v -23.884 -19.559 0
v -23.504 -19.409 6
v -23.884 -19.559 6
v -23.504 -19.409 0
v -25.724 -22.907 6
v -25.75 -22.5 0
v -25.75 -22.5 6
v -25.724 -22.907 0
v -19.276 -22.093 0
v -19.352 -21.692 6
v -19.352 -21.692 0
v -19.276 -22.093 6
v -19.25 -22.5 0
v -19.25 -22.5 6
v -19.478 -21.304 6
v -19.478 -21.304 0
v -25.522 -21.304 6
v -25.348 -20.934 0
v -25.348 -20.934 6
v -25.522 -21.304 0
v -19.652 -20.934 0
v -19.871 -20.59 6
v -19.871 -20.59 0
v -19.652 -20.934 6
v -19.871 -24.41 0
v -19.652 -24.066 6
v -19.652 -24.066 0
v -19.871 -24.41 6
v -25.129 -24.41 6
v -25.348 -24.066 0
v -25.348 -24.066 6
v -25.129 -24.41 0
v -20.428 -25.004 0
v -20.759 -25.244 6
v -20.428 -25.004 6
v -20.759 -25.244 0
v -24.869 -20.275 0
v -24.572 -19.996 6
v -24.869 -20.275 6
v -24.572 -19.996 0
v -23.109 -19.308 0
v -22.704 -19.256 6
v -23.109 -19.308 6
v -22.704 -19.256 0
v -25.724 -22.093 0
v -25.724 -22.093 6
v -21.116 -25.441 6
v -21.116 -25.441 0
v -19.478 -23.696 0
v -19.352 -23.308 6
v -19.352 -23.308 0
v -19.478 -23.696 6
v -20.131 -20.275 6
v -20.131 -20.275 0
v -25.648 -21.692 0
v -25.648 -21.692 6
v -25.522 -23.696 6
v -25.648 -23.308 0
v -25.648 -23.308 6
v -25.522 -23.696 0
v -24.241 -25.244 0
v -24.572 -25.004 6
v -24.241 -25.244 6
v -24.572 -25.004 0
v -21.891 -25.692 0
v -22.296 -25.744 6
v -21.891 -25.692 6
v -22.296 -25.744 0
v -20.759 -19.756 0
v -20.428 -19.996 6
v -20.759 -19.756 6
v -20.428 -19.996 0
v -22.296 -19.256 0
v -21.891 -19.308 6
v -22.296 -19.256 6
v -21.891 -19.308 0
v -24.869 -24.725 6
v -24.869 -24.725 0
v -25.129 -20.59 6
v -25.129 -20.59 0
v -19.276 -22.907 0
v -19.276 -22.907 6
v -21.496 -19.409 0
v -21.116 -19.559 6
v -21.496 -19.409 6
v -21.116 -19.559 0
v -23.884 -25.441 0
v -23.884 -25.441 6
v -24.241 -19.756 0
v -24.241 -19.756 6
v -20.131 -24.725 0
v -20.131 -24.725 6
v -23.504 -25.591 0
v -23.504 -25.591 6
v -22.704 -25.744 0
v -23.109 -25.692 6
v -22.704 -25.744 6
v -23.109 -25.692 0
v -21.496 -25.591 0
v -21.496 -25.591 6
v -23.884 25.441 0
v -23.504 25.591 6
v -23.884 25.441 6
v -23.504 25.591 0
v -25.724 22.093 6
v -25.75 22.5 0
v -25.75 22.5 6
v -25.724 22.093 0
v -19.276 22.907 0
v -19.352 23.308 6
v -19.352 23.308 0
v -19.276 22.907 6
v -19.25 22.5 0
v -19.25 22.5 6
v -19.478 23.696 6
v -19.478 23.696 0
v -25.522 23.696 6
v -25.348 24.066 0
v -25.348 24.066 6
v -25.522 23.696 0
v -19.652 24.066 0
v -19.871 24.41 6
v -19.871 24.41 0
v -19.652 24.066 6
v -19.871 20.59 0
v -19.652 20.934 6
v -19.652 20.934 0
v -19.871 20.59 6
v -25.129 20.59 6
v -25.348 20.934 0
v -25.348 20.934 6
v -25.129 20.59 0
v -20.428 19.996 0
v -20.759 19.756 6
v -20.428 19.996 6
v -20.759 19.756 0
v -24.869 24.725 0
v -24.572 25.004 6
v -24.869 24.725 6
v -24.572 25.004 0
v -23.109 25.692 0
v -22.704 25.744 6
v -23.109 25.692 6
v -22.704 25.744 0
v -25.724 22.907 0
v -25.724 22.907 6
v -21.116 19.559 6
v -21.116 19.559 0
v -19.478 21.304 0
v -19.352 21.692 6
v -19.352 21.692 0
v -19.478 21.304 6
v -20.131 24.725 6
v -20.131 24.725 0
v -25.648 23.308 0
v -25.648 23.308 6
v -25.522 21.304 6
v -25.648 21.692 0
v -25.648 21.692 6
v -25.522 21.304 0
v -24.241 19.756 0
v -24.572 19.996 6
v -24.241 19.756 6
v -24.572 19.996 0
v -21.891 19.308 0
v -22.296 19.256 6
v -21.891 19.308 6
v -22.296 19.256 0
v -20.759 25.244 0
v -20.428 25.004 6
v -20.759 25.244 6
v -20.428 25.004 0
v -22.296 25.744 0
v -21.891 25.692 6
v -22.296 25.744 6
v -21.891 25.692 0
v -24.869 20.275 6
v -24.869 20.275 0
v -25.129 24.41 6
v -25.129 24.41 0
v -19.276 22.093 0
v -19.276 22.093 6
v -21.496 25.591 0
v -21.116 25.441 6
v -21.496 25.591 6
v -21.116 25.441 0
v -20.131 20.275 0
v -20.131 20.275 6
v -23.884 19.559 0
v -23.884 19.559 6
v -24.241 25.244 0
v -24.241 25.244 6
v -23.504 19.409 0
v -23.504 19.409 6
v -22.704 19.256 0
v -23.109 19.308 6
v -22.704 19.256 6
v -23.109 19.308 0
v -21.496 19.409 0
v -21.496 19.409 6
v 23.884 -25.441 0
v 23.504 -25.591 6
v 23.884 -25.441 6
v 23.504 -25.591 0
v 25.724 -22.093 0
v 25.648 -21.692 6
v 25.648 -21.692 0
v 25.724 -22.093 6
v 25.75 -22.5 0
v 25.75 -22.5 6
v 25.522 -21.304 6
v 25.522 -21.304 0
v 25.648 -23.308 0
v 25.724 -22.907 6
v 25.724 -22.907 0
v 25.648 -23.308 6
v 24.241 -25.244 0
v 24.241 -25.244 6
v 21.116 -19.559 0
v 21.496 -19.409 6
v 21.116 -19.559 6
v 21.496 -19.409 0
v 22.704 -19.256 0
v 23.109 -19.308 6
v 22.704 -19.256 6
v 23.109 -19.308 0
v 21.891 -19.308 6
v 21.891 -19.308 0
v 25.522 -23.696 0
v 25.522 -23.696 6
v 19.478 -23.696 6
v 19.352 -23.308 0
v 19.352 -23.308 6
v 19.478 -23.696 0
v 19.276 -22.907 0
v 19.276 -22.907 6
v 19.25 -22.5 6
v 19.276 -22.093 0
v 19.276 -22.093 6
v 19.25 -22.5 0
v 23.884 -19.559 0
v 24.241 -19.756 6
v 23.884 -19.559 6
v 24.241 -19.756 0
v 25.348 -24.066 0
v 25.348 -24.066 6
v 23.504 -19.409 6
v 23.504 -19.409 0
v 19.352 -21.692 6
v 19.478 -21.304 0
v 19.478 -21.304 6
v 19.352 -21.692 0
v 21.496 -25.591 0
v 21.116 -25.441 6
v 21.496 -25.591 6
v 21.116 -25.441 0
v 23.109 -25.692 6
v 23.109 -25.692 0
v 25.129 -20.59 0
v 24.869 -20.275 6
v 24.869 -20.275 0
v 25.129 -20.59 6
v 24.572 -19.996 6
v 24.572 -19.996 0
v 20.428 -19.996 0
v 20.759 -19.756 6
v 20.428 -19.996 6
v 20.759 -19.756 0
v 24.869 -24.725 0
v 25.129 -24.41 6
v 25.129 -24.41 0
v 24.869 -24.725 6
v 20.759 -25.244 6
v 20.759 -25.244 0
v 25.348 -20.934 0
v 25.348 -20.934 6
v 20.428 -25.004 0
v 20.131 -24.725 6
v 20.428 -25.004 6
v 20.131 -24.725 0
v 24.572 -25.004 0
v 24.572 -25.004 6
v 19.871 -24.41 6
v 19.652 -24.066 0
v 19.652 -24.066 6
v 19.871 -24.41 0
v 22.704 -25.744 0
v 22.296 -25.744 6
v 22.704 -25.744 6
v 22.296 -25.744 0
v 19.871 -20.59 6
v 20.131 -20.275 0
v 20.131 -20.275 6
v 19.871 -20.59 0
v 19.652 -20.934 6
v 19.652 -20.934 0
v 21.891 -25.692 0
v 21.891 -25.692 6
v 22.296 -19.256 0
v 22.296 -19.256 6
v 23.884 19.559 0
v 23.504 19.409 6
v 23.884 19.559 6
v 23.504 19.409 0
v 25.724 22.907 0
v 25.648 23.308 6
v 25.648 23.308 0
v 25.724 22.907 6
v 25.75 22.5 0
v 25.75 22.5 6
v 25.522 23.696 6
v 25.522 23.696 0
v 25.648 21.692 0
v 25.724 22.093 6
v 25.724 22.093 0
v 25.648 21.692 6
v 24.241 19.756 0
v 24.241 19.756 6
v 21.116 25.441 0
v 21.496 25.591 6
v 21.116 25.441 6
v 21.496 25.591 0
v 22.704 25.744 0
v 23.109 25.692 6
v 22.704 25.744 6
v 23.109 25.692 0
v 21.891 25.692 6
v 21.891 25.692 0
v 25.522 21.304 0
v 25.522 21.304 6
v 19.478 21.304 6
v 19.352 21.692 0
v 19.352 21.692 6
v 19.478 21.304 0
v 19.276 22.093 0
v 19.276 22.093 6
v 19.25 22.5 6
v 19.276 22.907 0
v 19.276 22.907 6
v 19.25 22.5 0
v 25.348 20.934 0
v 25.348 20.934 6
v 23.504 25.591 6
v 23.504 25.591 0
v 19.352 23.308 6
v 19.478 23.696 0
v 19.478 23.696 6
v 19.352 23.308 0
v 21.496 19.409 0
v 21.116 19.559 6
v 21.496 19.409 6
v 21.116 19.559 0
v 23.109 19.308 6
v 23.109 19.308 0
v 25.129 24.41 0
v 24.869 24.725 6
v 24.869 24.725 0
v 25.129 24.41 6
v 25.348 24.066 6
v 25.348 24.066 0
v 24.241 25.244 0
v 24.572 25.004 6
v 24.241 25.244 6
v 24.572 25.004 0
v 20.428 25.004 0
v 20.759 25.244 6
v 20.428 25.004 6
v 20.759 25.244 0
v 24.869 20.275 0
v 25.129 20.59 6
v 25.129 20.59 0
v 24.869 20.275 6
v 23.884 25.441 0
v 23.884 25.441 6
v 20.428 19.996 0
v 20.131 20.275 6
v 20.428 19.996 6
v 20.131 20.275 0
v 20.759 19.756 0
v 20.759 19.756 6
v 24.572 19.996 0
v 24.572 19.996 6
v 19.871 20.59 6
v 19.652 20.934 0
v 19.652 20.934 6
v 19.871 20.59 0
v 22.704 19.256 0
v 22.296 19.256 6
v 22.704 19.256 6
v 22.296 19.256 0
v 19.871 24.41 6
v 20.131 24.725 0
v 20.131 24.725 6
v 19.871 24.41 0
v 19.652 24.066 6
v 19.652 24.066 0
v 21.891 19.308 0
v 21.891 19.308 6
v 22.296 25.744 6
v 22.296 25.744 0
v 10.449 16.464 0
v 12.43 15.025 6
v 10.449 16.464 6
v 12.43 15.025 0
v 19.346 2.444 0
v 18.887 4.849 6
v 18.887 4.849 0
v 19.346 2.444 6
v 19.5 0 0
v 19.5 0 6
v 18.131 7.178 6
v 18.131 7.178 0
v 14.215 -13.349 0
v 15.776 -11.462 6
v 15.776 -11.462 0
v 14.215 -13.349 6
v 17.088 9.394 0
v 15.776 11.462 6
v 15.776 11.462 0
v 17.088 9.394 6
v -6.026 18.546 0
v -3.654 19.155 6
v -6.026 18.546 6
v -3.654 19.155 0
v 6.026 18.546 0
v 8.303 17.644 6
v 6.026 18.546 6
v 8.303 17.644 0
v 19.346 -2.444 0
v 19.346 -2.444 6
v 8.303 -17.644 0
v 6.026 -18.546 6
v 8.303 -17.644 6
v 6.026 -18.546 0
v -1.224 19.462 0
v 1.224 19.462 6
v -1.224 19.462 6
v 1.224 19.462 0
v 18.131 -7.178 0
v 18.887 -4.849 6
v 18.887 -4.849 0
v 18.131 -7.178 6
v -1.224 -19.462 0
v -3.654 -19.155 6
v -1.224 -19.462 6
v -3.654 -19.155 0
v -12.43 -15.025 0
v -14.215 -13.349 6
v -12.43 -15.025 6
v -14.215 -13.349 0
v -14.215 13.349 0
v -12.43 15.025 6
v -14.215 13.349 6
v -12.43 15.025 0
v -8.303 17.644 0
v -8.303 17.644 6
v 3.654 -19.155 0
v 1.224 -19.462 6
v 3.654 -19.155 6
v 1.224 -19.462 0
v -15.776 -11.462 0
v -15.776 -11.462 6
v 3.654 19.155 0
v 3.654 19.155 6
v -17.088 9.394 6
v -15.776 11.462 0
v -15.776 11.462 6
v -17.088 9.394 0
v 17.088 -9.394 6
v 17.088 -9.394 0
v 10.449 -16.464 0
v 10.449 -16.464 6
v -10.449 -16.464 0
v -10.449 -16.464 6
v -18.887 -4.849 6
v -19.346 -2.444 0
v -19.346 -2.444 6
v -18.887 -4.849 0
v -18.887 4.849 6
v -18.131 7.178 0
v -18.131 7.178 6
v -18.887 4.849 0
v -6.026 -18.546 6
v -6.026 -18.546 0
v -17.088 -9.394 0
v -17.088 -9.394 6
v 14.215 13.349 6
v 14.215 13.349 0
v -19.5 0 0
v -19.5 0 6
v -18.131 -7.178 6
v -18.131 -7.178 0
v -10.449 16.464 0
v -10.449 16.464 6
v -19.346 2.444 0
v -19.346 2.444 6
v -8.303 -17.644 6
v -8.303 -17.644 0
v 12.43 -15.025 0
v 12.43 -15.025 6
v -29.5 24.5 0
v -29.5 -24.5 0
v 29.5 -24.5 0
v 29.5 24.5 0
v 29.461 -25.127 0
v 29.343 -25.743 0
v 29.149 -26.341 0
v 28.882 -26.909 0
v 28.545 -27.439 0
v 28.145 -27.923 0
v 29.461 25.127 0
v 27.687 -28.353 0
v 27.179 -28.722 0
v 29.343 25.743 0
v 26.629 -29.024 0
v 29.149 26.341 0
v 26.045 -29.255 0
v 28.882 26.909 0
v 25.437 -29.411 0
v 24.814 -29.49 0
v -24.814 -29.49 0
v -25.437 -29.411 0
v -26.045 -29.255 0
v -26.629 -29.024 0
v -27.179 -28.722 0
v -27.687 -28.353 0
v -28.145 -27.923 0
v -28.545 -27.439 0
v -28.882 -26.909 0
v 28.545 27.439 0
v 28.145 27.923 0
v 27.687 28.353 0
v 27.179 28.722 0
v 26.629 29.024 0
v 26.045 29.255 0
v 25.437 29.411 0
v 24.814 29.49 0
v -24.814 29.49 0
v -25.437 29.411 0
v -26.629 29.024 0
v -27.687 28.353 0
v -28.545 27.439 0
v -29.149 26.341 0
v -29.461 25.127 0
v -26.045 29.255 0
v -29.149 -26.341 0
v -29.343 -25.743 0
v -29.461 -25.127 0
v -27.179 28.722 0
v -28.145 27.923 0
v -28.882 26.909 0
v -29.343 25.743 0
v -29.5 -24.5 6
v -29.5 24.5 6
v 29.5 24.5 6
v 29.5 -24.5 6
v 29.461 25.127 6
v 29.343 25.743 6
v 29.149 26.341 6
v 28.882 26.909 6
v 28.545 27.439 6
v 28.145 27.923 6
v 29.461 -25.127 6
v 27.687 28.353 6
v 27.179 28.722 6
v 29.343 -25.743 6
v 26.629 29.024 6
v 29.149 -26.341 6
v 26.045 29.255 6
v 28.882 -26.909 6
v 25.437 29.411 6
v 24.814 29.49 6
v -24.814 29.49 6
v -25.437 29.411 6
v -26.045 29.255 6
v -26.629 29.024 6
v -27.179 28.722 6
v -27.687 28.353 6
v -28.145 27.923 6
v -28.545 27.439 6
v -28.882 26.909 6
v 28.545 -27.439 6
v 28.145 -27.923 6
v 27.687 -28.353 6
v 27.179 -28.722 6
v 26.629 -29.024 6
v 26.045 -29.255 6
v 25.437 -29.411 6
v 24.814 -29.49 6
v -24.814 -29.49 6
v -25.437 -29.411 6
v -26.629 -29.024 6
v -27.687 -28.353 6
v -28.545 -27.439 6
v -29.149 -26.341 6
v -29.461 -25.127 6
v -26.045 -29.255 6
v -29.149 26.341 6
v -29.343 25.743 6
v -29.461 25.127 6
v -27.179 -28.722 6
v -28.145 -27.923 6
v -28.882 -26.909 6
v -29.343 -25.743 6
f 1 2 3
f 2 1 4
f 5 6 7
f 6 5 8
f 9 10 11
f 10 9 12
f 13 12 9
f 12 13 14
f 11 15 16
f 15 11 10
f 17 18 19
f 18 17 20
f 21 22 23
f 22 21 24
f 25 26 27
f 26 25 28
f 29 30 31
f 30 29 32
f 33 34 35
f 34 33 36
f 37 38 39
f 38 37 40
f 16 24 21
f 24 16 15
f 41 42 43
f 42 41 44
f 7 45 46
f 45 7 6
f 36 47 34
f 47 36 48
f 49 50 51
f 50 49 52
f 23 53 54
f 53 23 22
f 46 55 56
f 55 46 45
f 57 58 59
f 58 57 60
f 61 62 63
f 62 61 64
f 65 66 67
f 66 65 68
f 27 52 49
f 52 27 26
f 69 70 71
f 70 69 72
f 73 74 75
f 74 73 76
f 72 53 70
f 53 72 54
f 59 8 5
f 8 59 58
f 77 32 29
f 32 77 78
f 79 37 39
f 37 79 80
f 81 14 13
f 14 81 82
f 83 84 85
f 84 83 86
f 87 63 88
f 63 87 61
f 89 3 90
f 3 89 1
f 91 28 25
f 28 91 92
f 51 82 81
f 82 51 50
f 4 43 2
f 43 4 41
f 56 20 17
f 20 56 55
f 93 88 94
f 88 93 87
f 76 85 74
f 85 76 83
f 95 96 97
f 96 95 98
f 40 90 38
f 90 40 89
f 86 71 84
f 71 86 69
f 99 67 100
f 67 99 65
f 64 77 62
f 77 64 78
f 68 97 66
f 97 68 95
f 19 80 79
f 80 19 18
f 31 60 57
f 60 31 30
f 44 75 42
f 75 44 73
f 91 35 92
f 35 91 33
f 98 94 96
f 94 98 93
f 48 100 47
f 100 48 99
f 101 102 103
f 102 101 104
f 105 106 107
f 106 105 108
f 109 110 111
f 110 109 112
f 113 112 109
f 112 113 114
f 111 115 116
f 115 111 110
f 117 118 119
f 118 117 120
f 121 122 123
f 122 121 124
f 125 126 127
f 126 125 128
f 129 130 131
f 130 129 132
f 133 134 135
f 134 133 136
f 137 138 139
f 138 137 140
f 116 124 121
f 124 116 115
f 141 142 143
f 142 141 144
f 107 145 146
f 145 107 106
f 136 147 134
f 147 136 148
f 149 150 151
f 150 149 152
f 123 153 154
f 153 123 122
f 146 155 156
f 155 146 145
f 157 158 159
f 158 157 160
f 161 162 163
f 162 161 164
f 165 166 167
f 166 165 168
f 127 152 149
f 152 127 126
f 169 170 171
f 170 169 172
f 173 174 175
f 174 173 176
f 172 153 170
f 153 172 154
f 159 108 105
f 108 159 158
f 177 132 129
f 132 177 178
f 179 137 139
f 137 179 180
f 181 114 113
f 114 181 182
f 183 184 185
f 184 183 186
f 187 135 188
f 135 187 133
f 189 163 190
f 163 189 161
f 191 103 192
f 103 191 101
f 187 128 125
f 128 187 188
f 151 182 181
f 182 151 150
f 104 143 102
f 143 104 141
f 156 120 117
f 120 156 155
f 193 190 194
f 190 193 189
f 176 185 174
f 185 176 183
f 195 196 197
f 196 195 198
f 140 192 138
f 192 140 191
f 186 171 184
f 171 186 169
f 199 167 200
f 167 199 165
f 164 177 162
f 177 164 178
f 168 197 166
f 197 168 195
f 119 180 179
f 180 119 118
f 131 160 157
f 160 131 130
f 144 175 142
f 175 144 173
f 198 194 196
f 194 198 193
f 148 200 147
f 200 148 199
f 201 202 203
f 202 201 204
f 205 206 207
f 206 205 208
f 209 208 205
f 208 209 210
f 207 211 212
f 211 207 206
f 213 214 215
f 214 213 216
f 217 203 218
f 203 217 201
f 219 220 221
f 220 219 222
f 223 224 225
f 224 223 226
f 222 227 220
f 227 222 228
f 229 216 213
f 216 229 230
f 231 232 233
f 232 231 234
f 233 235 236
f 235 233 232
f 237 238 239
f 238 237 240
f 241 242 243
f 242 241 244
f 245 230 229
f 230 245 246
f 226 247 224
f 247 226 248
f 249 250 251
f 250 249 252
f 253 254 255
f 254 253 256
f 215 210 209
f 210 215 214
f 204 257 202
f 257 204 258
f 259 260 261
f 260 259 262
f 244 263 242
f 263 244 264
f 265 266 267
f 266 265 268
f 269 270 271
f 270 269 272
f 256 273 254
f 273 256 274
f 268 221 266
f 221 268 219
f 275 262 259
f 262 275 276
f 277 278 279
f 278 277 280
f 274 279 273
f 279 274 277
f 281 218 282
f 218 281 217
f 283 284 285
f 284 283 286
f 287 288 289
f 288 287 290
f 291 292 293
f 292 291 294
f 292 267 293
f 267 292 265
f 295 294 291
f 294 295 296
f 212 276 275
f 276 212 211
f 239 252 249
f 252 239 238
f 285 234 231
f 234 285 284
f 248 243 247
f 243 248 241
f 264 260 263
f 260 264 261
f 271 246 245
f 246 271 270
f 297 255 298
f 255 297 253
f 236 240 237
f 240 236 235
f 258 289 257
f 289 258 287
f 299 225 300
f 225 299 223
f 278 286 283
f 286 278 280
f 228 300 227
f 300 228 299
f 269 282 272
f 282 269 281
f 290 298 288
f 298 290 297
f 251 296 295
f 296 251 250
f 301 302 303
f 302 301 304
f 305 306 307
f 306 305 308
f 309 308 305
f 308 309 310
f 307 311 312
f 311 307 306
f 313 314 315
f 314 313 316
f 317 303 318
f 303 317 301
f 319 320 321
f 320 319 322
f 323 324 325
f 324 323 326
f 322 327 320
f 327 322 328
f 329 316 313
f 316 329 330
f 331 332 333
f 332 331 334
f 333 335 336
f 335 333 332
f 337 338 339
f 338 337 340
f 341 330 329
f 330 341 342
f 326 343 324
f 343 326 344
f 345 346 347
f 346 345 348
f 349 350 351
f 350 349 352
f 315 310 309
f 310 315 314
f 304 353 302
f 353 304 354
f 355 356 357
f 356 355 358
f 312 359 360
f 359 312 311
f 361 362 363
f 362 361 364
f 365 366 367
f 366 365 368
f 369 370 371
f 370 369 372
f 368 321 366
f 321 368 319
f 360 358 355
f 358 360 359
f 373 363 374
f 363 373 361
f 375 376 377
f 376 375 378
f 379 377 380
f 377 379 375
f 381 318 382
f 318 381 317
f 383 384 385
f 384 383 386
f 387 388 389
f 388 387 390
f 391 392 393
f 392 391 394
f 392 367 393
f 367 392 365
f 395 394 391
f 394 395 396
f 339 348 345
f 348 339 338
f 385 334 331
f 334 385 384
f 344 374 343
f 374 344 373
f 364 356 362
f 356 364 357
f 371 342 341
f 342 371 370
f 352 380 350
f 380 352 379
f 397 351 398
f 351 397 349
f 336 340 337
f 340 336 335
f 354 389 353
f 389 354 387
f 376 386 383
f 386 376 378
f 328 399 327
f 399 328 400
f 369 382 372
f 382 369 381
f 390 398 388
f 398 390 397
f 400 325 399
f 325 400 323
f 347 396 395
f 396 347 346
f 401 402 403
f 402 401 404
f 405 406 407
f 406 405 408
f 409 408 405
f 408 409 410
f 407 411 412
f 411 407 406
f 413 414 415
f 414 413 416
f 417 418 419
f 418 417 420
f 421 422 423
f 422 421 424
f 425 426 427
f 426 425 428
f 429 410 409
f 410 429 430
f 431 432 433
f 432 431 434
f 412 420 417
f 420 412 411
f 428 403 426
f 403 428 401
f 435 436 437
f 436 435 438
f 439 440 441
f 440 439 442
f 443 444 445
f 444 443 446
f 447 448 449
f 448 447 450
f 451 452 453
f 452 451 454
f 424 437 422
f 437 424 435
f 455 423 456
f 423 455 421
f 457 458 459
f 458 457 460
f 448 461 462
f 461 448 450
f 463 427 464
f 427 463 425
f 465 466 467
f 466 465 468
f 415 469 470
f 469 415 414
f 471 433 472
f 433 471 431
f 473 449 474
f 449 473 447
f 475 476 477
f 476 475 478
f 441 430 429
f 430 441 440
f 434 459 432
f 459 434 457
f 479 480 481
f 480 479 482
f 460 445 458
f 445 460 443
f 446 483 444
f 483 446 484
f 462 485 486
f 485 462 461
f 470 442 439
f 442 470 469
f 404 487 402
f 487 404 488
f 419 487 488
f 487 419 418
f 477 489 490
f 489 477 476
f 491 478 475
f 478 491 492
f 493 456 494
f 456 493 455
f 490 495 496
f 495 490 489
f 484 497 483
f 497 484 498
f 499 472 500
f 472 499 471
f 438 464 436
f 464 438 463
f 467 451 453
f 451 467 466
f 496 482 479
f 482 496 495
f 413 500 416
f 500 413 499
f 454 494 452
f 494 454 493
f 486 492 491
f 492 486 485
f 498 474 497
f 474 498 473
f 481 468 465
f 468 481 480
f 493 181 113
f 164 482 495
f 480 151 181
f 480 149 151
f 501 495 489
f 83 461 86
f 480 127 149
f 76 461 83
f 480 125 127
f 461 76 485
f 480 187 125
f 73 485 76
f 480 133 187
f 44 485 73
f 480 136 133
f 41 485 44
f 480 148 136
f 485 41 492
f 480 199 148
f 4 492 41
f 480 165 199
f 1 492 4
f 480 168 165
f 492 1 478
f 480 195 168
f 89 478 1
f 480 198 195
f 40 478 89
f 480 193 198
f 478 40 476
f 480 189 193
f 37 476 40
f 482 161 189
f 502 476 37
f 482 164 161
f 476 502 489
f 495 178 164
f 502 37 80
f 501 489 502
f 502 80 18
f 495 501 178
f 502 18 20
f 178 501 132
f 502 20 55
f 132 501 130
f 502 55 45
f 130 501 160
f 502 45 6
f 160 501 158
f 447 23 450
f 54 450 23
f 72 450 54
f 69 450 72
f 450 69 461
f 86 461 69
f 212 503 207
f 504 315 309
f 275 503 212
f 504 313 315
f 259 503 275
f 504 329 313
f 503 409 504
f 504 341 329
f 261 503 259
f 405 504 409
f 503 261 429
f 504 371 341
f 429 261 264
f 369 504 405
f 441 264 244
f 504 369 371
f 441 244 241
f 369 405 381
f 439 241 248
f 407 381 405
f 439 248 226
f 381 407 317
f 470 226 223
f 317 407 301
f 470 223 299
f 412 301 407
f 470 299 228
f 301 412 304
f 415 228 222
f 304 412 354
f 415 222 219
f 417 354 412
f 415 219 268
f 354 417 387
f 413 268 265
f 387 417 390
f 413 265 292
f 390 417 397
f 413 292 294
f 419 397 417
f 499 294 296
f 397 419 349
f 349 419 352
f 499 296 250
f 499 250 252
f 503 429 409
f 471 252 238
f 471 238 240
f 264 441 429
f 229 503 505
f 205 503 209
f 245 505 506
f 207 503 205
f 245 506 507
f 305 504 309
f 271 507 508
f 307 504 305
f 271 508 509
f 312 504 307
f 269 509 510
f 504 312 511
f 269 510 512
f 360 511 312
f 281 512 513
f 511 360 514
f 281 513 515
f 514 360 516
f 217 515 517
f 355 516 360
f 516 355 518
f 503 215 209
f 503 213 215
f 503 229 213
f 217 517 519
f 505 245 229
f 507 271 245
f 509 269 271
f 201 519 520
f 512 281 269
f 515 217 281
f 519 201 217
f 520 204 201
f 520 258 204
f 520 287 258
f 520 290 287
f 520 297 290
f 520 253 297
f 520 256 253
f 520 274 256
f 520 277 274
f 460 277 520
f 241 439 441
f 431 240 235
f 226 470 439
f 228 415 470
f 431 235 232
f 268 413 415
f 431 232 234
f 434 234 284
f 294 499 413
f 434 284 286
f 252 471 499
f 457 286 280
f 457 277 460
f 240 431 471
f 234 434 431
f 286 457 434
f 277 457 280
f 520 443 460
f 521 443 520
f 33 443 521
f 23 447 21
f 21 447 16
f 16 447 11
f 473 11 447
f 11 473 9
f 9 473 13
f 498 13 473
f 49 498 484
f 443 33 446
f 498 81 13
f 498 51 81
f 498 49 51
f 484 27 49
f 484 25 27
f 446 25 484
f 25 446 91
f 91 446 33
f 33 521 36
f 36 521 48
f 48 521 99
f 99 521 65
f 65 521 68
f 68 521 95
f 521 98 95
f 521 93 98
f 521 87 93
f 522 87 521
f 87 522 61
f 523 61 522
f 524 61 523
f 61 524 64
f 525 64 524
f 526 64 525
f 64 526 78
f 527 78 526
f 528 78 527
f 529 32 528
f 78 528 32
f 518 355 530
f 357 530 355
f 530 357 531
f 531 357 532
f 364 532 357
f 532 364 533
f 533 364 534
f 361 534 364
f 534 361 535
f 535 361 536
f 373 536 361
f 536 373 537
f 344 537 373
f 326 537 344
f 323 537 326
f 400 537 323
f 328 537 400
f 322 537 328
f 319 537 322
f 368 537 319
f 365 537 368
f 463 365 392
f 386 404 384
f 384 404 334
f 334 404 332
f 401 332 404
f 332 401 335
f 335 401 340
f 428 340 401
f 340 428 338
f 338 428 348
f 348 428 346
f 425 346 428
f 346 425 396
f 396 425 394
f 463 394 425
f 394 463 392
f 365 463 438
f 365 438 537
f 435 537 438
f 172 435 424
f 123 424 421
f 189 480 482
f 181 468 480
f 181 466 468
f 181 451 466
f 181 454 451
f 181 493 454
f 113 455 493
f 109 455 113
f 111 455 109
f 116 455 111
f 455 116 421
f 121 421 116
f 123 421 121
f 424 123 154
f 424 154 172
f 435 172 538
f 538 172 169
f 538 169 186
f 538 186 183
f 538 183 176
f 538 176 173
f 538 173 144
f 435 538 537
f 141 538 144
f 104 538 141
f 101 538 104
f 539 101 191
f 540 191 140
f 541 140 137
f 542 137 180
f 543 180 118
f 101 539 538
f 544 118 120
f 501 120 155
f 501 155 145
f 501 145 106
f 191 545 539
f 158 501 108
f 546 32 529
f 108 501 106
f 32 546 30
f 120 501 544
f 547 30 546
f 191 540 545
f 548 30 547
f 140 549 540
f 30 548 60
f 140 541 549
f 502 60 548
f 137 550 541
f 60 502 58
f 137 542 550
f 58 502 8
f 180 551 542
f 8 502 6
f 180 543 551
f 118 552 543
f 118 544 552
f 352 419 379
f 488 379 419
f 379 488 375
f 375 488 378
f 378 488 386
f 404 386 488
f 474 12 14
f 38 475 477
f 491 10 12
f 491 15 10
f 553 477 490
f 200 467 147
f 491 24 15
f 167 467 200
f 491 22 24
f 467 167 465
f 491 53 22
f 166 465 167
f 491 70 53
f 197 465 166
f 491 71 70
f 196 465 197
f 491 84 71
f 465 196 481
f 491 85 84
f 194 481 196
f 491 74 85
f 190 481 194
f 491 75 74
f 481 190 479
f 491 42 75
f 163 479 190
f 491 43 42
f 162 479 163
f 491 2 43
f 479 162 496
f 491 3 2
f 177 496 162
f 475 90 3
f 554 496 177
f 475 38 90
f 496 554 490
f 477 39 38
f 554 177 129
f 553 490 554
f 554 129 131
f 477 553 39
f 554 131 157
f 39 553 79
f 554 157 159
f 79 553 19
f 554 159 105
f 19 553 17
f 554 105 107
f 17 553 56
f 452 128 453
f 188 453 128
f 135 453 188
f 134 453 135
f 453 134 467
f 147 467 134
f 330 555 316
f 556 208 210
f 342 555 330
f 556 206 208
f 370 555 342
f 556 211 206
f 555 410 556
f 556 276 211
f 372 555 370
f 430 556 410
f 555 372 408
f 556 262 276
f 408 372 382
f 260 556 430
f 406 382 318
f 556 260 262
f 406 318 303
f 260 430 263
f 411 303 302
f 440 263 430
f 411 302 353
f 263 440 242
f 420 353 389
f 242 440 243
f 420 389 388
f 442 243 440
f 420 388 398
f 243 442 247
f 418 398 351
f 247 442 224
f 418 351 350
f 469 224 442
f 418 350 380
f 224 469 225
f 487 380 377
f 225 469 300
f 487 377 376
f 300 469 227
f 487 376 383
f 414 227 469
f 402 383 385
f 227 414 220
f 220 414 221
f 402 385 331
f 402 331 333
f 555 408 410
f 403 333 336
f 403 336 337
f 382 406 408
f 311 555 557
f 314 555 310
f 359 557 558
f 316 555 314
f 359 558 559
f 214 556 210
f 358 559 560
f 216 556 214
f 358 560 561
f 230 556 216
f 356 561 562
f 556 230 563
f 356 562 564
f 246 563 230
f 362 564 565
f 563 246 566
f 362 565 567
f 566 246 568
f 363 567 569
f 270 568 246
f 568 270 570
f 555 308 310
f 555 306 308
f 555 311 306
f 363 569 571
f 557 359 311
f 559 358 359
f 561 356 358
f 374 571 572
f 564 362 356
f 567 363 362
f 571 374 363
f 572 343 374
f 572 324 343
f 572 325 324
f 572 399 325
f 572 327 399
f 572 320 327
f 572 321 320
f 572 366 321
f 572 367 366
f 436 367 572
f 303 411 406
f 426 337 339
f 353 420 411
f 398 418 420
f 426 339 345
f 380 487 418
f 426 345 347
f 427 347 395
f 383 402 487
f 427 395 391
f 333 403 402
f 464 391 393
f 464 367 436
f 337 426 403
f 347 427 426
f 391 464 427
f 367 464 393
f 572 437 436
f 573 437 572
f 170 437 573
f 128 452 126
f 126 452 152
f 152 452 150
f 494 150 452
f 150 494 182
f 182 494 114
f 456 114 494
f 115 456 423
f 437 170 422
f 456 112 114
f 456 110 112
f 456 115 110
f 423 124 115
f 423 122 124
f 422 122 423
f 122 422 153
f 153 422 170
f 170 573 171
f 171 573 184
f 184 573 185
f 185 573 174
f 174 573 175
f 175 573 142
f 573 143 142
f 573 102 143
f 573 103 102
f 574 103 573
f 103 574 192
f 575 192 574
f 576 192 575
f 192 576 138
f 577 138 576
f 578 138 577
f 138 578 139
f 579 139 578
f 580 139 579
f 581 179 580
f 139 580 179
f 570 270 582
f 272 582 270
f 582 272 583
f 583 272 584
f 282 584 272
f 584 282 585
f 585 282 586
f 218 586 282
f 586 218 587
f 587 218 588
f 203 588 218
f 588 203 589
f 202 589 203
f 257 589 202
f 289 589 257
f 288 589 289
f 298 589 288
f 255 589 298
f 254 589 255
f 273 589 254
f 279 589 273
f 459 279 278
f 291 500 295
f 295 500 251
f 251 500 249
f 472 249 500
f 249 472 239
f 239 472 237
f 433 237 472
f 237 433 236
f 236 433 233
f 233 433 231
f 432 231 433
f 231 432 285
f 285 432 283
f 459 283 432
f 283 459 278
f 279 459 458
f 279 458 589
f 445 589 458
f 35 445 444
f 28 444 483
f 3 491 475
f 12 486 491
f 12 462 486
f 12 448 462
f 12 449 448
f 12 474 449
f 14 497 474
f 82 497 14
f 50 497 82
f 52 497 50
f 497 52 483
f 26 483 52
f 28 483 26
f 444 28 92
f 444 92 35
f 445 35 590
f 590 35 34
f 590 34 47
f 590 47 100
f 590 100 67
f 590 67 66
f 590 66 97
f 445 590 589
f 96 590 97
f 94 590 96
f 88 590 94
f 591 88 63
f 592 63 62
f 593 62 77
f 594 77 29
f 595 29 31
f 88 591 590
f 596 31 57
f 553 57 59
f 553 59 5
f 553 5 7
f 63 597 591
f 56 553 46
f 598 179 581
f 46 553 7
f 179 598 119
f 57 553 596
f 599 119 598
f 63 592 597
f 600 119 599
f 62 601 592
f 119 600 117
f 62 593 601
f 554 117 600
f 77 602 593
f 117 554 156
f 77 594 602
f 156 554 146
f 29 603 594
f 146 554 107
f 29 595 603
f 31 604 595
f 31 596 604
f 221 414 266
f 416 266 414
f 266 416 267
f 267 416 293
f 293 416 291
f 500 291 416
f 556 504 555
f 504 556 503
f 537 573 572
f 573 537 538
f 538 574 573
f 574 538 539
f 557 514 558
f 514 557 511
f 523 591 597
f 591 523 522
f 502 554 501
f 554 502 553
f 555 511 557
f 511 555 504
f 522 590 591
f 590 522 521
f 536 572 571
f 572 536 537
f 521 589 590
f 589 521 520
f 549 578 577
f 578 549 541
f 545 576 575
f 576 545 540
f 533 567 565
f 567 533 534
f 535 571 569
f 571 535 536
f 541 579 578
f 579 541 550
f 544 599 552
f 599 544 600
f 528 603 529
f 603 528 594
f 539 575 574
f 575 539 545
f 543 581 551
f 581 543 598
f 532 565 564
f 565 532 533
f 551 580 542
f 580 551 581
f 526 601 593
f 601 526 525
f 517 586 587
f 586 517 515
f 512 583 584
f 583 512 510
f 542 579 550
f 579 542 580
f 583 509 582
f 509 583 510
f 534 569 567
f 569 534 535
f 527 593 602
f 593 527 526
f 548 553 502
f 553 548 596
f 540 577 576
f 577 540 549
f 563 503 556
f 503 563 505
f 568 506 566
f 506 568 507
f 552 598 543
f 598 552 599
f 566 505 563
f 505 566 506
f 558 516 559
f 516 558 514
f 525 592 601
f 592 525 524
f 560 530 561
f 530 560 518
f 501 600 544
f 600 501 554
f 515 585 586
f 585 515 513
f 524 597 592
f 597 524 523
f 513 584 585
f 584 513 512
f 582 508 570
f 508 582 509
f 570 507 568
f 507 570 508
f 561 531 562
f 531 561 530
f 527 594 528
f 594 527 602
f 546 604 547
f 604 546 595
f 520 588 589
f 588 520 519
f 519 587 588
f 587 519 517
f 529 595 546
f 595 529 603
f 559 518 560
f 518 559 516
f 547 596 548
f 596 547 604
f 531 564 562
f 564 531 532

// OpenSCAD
$fn = 50;

difference() {
	union() {
		hull() {
			translate(v = [-24.5, 24.5, 0]) {
				cylinder(h = 6, r = 5);
			}
			translate(v = [24.5, 24.5, 0]) {
				cylinder(h = 6, r = 5);
			}
			translate(v = [-24.5, -24.5, 0]) {
				cylinder(h = 6, r = 5);
			}
			translate(v = [24.5, -24.5, 0]) {
				cylinder(h = 6, r = 5);
			}
		}
	}
	union() {
		translate(v = [-22.5, -22.5, -100.0]) {
			cylinder(h = 200, r = 3.25);
		}
		translate(v = [-22.5, 22.5, -100.0]) {
			cylinder(h = 200, r = 3.25);
		}
		translate(v = [22.5, -22.5, -100.0]) {
			cylinder(h = 200, r = 3.25);
		}
		translate(v = [22.5, 22.5, -100.0]) {
			cylinder(h = 200, r = 3.25);
		}
		translate(v = [-22.5, -22.5, -100.0]) {
			cylinder(h = 200, r = 1.8);
		}
		translate(v = [-22.5, 22.5, -100.0]) {
			cylinder(h = 200, r = 1.8);
		}
		translate(v = [22.5, -22.5, -100.0]) {
			cylinder(h = 200, r = 1.8);
		}
		translate(v = [22.5, 22.5, -100.0]) {
			cylinder(h = 200, r = 1.8);
		}
		cylinder(h = 6, r = 19.5);
	}
}
